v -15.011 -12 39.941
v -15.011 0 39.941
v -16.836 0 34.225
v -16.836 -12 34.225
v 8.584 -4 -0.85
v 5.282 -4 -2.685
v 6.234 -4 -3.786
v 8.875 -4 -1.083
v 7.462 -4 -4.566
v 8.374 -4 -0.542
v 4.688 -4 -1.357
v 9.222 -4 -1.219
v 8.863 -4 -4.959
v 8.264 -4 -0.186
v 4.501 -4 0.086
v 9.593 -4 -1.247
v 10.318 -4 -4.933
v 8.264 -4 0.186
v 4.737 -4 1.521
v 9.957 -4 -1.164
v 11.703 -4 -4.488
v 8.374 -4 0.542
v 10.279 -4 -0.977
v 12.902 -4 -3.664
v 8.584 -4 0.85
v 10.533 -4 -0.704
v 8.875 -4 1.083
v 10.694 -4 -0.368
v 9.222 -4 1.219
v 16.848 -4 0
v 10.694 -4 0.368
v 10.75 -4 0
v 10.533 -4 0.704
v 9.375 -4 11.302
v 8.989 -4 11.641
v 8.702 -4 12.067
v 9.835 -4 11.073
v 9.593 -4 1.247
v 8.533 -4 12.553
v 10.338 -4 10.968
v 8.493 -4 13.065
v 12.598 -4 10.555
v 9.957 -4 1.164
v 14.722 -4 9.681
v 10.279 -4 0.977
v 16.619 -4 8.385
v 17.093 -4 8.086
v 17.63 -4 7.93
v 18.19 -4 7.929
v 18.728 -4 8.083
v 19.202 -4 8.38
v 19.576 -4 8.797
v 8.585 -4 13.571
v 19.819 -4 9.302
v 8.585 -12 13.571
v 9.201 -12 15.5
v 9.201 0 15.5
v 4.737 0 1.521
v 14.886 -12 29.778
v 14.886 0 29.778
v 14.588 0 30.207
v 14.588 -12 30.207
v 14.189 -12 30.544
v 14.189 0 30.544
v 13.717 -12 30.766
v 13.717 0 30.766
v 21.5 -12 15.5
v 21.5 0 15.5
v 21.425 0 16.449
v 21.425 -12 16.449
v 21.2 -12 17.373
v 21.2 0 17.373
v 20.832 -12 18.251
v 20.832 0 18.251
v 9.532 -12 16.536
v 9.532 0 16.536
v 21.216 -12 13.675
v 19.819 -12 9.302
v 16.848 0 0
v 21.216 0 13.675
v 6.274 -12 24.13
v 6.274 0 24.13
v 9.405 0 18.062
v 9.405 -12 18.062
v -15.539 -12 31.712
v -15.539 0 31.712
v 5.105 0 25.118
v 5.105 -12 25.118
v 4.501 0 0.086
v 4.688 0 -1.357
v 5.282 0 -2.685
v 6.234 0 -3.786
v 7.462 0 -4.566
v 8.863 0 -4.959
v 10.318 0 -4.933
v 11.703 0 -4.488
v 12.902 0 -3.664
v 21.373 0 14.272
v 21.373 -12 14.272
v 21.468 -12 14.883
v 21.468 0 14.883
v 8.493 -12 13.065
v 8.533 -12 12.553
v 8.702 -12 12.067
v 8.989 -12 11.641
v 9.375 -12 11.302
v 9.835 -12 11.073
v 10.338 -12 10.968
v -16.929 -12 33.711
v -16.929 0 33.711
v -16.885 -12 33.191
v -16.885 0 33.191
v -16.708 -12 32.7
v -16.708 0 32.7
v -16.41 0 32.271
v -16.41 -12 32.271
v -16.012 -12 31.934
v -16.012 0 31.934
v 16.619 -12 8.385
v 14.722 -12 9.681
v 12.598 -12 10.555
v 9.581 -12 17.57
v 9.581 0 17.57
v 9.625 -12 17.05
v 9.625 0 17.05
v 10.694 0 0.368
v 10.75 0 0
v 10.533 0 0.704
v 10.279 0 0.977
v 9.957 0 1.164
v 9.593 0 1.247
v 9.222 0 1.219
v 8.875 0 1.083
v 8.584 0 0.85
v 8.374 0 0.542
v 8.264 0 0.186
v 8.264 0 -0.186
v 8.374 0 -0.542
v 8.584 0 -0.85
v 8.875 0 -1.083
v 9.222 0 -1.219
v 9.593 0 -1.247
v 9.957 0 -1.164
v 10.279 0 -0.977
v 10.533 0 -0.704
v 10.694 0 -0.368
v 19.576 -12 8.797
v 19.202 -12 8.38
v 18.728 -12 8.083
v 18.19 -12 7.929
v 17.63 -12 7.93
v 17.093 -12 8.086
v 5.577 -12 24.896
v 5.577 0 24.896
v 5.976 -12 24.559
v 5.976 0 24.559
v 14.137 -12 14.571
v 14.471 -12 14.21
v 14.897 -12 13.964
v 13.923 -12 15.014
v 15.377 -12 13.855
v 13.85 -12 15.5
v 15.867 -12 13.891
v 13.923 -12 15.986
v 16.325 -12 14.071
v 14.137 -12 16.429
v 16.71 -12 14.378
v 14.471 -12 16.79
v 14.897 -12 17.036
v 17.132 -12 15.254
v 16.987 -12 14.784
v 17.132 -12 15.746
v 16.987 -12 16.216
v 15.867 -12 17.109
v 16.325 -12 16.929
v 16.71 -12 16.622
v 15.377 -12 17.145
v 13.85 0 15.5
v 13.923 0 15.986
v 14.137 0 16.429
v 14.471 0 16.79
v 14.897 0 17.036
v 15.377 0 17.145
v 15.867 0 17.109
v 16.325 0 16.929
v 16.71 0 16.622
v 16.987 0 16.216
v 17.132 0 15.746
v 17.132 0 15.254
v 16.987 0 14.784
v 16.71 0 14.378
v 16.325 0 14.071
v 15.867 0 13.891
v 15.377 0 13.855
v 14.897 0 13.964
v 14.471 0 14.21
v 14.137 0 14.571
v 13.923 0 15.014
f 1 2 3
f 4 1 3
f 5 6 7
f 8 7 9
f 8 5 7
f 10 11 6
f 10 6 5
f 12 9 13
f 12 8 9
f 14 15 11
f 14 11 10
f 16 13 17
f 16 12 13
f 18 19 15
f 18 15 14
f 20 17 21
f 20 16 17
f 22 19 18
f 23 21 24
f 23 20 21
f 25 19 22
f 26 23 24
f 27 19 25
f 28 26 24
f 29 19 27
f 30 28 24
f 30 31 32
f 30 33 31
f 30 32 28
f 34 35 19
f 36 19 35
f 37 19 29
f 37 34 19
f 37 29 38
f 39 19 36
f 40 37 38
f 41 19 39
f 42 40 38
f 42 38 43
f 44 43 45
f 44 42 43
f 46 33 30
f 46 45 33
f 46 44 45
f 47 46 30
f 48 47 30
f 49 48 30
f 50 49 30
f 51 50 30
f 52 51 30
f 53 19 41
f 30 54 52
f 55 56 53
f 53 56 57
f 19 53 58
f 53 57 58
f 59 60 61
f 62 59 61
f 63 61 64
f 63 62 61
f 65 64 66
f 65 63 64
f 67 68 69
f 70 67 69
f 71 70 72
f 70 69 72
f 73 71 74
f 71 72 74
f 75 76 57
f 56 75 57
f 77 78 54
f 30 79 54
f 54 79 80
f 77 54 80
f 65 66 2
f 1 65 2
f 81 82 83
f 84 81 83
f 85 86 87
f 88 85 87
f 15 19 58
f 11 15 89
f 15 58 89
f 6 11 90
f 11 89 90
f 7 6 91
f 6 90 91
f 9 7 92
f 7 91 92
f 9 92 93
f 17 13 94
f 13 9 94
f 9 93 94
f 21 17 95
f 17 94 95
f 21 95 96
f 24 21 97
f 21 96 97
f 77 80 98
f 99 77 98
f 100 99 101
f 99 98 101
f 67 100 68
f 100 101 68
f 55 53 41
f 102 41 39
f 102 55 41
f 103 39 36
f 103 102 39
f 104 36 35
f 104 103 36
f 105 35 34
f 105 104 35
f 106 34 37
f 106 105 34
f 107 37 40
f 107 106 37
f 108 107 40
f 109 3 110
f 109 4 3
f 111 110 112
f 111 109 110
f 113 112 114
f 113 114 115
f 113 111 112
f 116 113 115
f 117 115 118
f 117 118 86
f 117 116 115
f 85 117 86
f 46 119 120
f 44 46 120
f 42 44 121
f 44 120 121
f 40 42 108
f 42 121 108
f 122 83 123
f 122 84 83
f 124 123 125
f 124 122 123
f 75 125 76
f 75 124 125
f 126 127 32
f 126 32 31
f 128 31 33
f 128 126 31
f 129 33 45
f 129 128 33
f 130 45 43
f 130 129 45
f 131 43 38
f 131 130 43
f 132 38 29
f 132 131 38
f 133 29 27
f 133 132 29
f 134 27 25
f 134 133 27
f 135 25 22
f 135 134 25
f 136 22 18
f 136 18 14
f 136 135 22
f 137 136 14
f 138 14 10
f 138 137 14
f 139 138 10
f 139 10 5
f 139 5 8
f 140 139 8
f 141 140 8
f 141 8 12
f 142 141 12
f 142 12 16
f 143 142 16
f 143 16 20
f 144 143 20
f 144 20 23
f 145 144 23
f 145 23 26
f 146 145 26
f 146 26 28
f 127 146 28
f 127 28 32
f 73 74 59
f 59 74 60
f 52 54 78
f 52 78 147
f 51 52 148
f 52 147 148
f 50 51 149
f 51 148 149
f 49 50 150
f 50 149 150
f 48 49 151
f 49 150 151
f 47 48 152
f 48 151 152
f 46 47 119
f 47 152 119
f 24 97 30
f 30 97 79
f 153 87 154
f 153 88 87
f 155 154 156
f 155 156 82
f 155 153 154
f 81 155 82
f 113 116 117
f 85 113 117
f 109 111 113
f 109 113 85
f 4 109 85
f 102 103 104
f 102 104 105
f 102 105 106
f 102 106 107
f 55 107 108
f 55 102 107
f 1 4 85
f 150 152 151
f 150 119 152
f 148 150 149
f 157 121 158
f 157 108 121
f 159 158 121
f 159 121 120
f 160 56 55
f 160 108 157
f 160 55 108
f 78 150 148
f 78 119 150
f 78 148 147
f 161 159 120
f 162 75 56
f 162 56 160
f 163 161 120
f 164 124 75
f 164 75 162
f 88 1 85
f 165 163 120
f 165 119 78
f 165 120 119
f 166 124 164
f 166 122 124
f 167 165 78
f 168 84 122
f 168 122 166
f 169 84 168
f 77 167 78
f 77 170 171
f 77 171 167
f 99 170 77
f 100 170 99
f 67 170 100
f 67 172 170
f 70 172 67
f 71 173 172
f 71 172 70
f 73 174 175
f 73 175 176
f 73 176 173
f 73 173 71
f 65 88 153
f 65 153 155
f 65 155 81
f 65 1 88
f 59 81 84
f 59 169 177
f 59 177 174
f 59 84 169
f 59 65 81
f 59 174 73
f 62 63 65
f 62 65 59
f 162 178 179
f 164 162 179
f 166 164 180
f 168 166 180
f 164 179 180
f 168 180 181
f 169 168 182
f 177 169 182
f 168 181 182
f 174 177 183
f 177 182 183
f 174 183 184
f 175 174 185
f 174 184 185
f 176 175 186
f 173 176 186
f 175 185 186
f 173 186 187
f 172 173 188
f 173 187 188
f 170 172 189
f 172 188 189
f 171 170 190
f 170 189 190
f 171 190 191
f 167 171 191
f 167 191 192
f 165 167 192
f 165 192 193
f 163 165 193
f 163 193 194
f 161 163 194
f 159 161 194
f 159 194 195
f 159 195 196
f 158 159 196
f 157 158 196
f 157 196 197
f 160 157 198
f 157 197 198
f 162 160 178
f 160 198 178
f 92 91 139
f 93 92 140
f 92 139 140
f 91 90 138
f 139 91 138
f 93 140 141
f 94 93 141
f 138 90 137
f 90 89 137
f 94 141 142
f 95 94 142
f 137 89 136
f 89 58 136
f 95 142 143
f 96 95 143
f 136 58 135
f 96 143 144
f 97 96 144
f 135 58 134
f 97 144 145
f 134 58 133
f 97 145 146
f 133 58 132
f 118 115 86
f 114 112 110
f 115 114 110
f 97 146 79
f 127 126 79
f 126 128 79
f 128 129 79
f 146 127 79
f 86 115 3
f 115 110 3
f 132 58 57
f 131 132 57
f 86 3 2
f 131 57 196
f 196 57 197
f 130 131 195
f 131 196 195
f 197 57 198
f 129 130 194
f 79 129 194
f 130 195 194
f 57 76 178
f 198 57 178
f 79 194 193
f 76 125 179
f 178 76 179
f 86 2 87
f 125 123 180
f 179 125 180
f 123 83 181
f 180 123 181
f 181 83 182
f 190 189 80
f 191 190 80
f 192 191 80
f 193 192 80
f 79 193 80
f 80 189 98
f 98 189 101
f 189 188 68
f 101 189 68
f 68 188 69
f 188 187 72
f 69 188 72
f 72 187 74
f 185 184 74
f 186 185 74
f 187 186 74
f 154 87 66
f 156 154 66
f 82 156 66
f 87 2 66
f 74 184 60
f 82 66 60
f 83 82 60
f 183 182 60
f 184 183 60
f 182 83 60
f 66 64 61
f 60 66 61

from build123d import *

# Parameters (mm, degrees)
F0_R     = 1.25
F1_DEPTH = 12
F2_R     = 11
F2_R_2   = 1.25
F3_DEPTH = 8
F4_R     = 2


with BuildPart() as f1:
    # F0 (on Front) → F1 (new body)
    with BuildSketch(Plane.XZ):
        with BuildLine():
            Line((5.8942117522, 24.8663670726), (17.3253891795, 21.2155887136))
            ThreePointArc((17.3253891795, 21.2155887136), (19.3737008087, 20.0819692322), (20.832276605, 18.2507864708))
            Line((20.832276605, 18.2507864708), (14.5059308294, 30.5141249497))
            Line((14.5059308294, 30.5141249497), (-15.0105899225, 39.9408245069))
            Line((-15.0105899225, 39.9408245069), (-17.4444421618, 32.3200395554))
            Line((-17.4444421618, 32.3200395554), (5.8942117522, 24.8663670726))
        make_face()
        with BuildLine():
            Line((5.8942117522, 24.8663670726), (9.7844112864, 17.3253891795))
            ThreePointArc((9.7844112864, 17.3253891795), (12.7492135292, 20.832276605), (17.3253891795, 21.2155887136))
            Line((17.3253891795, 21.2155887136), (5.8942117522, 24.8663670726))
        make_face()
        with BuildLine():
            ThreePointArc((17.3253891795, 21.2155887136), (12.7492135292, 20.832276605), (9.7844112864, 17.3253891795))
            ThreePointArc((9.7844112864, 17.3253891795), (9.5715291903, 16.4237065871), (9.5, 15.5))
            ThreePointArc((9.5, 15.5), (14.5762934129, 9.5715291903), (21.2155887136, 13.6746108205))
            ThreePointArc((21.2155887136, 13.6746108205), (21.4284708097, 14.5762934129), (21.5, 15.5))
            ThreePointArc((21.5, 15.5), (21.3306800474, 16.9153339482), (20.832276605, 18.2507864708))
            ThreePointArc((20.832276605, 18.2507864708), (19.3737008087, 20.0819692322), (17.3253891795, 21.2155887136))
        make_face()
        with BuildLine():
            ThreePointArc((17.15, 15.5), (15.5, 13.85), (13.85, 15.5))
            ThreePointArc((13.85, 15.5), (15.5, 17.15), (17.15, 15.5))
        make_face(mode=Mode.SUBTRACT)
        with BuildLine():
            ThreePointArc((4.7370094053, 1.5211576496), (10.2697554893, 4.9403923414), (14.5, 0))
            ThreePointArc((14.5, 0), (14.0831583376, -1.9986644672), (12.9021361391, -3.6640782867))
            Line((12.9021361391, -3.6640782867), (16.8483243992, 0))
            Line((16.8483243992, 0), (21.2155887136, 13.6746108205))
            ThreePointArc((21.2155887136, 13.6746108205), (14.5762934129, 9.5715291903), (9.5, 15.5))
            Line((9.5, 15.5), (9.2014362293, 15.5))
            Line((9.2014362293, 15.5), (4.7370094053, 1.5211576496))
        make_face()
        with BuildLine():
            ThreePointArc((12.9021361391, -3.6640782867), (14.0831583376, -1.9986644672), (14.5, 0))
            ThreePointArc((14.5, 0), (10.2697554893, 4.9403923414), (4.7370094053, 1.5211576496))
            ThreePointArc((4.7370094053, 1.5211576496), (6.819580417, -4.2208234811), (12.9021361391, -3.6640782867))
        make_face()
        with Locations((9.5, 0)):
            Circle(F0_R, mode=Mode.SUBTRACT)
        with BuildLine():
            Line((9.7844112864, 17.3253891795), (9.2014362293, 15.5))
            Line((9.2014362293, 15.5), (9.5, 15.5))
            ThreePointArc((9.5, 15.5), (9.5715291903, 16.4237065871), (9.7844112864, 17.3253891795))
        make_face()
    extrude(amount=F1_DEPTH)

    # F2 (on face) → F3 (cut)
    with BuildSketch(Plane.XZ.offset(12)):
        with Locations((9.5, 0)):
            Circle(F2_R)
        with Locations((9.5, 0)):
            Circle(F2_R_2, mode=Mode.SUBTRACT)
    extrude(amount=-F3_DEPTH, mode=Mode.SUBTRACT)

    # F4
    f4_edges = [f1.edges().sort_by_distance(p)[0] for p in [
        (-17.444442, -6, 32.32004),
        (5.894212, -6, 24.866367),
        (9.784411, -6, 17.325389),
        (7.717857, -8, 10.854675),
        (18.749677, -8, 5.953442),
        (14.505931, -6, 30.514125),
    ]]
    fillet(f4_edges, radius=F4_R)


solid = f1.part
